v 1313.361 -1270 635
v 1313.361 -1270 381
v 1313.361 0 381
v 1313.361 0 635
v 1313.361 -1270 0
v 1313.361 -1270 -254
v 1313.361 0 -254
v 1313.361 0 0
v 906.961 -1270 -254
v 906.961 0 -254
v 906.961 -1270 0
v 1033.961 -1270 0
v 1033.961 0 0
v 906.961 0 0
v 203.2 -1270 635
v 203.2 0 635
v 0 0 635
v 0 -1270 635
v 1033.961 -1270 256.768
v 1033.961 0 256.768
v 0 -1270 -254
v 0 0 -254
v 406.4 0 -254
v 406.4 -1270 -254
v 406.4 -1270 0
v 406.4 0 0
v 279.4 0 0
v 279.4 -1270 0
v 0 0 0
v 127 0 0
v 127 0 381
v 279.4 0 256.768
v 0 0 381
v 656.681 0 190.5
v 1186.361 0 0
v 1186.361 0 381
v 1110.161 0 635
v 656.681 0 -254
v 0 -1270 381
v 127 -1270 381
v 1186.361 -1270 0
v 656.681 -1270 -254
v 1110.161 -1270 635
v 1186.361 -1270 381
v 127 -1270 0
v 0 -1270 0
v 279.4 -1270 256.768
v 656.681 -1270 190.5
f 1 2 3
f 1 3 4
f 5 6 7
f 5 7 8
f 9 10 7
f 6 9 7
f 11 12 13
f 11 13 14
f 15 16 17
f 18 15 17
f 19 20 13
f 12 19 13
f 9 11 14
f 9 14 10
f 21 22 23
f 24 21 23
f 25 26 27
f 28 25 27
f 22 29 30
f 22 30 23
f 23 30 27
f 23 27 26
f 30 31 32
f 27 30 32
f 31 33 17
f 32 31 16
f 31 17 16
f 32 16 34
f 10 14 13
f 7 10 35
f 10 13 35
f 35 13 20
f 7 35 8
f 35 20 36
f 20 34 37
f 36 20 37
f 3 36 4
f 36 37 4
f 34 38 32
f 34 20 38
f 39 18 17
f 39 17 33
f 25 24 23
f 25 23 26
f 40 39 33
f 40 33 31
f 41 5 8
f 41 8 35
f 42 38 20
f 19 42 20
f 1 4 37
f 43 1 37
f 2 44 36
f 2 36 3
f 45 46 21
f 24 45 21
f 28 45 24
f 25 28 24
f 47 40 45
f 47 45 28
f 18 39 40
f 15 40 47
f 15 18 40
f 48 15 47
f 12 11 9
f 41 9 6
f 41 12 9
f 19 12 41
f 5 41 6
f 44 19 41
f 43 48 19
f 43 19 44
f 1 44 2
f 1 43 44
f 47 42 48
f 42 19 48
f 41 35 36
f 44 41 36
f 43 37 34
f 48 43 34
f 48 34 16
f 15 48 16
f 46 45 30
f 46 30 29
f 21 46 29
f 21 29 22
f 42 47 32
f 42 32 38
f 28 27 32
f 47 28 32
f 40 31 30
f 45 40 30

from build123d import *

# Parameters (mm, degrees)
F1_DEPTH = 1270
F2_DEPTH = 127
F3_DEPTH = 25.4


with BuildPart() as f1:
    # F0 (on Front) → F1 (new body)
    with BuildSketch(Plane.XZ):
        Polygon((127, 0), (0, 0), (0, -254), (406.4, -254), (406.4, 0), (279.4, 0), (279.4, 256.7683129114), (656.6807052125, -254), (1033.9614104249, 256.7683129114), (1033.9614104249, 0), (906.9614104249, 0), (906.9614104249, -254), (1313.3614104249, -254), (1313.3614104249, 0), (1186.3614104249, 0), (1186.3614104249, 381), (1313.3614104249, 381), (1313.3614104249, 635), (1110.1614104249, 635), (656.6807052125, 190.5), (203.2, 635), (0, 635), (0, 381), (127, 381), align=None)
    extrude(amount=F1_DEPTH)

    # F2 (add): a face of the model
    f2_faces = [f1.faces().sort_by_distance(p)[0] for p in [
        (656.6807052125, 0, 153.5673559102),
    ]]
    extrude(f2_faces, amount=-F2_DEPTH)

    # F0 (on Front) → F3 (join)
    with BuildSketch(Plane.XZ):
        Polygon((127, 0), (0, 0), (0, -254), (406.4, -254), (406.4, 0), (279.4, 0), (279.4, 256.7683129114), (656.6807052125, -254), (1033.9614104249, 256.7683129114), (1033.9614104249, 0), (906.9614104249, 0), (906.9614104249, -254), (1313.3614104249, -254), (1313.3614104249, 0), (1186.3614104249, 0), (1186.3614104249, 381), (1313.3614104249, 381), (1313.3614104249, 635), (1110.1614104249, 635), (656.6807052125, 190.5), (203.2, 635), (0, 635), (0, 381), (127, 381), align=None)
    extrude(amount=F3_DEPTH)


solid = f1.part
